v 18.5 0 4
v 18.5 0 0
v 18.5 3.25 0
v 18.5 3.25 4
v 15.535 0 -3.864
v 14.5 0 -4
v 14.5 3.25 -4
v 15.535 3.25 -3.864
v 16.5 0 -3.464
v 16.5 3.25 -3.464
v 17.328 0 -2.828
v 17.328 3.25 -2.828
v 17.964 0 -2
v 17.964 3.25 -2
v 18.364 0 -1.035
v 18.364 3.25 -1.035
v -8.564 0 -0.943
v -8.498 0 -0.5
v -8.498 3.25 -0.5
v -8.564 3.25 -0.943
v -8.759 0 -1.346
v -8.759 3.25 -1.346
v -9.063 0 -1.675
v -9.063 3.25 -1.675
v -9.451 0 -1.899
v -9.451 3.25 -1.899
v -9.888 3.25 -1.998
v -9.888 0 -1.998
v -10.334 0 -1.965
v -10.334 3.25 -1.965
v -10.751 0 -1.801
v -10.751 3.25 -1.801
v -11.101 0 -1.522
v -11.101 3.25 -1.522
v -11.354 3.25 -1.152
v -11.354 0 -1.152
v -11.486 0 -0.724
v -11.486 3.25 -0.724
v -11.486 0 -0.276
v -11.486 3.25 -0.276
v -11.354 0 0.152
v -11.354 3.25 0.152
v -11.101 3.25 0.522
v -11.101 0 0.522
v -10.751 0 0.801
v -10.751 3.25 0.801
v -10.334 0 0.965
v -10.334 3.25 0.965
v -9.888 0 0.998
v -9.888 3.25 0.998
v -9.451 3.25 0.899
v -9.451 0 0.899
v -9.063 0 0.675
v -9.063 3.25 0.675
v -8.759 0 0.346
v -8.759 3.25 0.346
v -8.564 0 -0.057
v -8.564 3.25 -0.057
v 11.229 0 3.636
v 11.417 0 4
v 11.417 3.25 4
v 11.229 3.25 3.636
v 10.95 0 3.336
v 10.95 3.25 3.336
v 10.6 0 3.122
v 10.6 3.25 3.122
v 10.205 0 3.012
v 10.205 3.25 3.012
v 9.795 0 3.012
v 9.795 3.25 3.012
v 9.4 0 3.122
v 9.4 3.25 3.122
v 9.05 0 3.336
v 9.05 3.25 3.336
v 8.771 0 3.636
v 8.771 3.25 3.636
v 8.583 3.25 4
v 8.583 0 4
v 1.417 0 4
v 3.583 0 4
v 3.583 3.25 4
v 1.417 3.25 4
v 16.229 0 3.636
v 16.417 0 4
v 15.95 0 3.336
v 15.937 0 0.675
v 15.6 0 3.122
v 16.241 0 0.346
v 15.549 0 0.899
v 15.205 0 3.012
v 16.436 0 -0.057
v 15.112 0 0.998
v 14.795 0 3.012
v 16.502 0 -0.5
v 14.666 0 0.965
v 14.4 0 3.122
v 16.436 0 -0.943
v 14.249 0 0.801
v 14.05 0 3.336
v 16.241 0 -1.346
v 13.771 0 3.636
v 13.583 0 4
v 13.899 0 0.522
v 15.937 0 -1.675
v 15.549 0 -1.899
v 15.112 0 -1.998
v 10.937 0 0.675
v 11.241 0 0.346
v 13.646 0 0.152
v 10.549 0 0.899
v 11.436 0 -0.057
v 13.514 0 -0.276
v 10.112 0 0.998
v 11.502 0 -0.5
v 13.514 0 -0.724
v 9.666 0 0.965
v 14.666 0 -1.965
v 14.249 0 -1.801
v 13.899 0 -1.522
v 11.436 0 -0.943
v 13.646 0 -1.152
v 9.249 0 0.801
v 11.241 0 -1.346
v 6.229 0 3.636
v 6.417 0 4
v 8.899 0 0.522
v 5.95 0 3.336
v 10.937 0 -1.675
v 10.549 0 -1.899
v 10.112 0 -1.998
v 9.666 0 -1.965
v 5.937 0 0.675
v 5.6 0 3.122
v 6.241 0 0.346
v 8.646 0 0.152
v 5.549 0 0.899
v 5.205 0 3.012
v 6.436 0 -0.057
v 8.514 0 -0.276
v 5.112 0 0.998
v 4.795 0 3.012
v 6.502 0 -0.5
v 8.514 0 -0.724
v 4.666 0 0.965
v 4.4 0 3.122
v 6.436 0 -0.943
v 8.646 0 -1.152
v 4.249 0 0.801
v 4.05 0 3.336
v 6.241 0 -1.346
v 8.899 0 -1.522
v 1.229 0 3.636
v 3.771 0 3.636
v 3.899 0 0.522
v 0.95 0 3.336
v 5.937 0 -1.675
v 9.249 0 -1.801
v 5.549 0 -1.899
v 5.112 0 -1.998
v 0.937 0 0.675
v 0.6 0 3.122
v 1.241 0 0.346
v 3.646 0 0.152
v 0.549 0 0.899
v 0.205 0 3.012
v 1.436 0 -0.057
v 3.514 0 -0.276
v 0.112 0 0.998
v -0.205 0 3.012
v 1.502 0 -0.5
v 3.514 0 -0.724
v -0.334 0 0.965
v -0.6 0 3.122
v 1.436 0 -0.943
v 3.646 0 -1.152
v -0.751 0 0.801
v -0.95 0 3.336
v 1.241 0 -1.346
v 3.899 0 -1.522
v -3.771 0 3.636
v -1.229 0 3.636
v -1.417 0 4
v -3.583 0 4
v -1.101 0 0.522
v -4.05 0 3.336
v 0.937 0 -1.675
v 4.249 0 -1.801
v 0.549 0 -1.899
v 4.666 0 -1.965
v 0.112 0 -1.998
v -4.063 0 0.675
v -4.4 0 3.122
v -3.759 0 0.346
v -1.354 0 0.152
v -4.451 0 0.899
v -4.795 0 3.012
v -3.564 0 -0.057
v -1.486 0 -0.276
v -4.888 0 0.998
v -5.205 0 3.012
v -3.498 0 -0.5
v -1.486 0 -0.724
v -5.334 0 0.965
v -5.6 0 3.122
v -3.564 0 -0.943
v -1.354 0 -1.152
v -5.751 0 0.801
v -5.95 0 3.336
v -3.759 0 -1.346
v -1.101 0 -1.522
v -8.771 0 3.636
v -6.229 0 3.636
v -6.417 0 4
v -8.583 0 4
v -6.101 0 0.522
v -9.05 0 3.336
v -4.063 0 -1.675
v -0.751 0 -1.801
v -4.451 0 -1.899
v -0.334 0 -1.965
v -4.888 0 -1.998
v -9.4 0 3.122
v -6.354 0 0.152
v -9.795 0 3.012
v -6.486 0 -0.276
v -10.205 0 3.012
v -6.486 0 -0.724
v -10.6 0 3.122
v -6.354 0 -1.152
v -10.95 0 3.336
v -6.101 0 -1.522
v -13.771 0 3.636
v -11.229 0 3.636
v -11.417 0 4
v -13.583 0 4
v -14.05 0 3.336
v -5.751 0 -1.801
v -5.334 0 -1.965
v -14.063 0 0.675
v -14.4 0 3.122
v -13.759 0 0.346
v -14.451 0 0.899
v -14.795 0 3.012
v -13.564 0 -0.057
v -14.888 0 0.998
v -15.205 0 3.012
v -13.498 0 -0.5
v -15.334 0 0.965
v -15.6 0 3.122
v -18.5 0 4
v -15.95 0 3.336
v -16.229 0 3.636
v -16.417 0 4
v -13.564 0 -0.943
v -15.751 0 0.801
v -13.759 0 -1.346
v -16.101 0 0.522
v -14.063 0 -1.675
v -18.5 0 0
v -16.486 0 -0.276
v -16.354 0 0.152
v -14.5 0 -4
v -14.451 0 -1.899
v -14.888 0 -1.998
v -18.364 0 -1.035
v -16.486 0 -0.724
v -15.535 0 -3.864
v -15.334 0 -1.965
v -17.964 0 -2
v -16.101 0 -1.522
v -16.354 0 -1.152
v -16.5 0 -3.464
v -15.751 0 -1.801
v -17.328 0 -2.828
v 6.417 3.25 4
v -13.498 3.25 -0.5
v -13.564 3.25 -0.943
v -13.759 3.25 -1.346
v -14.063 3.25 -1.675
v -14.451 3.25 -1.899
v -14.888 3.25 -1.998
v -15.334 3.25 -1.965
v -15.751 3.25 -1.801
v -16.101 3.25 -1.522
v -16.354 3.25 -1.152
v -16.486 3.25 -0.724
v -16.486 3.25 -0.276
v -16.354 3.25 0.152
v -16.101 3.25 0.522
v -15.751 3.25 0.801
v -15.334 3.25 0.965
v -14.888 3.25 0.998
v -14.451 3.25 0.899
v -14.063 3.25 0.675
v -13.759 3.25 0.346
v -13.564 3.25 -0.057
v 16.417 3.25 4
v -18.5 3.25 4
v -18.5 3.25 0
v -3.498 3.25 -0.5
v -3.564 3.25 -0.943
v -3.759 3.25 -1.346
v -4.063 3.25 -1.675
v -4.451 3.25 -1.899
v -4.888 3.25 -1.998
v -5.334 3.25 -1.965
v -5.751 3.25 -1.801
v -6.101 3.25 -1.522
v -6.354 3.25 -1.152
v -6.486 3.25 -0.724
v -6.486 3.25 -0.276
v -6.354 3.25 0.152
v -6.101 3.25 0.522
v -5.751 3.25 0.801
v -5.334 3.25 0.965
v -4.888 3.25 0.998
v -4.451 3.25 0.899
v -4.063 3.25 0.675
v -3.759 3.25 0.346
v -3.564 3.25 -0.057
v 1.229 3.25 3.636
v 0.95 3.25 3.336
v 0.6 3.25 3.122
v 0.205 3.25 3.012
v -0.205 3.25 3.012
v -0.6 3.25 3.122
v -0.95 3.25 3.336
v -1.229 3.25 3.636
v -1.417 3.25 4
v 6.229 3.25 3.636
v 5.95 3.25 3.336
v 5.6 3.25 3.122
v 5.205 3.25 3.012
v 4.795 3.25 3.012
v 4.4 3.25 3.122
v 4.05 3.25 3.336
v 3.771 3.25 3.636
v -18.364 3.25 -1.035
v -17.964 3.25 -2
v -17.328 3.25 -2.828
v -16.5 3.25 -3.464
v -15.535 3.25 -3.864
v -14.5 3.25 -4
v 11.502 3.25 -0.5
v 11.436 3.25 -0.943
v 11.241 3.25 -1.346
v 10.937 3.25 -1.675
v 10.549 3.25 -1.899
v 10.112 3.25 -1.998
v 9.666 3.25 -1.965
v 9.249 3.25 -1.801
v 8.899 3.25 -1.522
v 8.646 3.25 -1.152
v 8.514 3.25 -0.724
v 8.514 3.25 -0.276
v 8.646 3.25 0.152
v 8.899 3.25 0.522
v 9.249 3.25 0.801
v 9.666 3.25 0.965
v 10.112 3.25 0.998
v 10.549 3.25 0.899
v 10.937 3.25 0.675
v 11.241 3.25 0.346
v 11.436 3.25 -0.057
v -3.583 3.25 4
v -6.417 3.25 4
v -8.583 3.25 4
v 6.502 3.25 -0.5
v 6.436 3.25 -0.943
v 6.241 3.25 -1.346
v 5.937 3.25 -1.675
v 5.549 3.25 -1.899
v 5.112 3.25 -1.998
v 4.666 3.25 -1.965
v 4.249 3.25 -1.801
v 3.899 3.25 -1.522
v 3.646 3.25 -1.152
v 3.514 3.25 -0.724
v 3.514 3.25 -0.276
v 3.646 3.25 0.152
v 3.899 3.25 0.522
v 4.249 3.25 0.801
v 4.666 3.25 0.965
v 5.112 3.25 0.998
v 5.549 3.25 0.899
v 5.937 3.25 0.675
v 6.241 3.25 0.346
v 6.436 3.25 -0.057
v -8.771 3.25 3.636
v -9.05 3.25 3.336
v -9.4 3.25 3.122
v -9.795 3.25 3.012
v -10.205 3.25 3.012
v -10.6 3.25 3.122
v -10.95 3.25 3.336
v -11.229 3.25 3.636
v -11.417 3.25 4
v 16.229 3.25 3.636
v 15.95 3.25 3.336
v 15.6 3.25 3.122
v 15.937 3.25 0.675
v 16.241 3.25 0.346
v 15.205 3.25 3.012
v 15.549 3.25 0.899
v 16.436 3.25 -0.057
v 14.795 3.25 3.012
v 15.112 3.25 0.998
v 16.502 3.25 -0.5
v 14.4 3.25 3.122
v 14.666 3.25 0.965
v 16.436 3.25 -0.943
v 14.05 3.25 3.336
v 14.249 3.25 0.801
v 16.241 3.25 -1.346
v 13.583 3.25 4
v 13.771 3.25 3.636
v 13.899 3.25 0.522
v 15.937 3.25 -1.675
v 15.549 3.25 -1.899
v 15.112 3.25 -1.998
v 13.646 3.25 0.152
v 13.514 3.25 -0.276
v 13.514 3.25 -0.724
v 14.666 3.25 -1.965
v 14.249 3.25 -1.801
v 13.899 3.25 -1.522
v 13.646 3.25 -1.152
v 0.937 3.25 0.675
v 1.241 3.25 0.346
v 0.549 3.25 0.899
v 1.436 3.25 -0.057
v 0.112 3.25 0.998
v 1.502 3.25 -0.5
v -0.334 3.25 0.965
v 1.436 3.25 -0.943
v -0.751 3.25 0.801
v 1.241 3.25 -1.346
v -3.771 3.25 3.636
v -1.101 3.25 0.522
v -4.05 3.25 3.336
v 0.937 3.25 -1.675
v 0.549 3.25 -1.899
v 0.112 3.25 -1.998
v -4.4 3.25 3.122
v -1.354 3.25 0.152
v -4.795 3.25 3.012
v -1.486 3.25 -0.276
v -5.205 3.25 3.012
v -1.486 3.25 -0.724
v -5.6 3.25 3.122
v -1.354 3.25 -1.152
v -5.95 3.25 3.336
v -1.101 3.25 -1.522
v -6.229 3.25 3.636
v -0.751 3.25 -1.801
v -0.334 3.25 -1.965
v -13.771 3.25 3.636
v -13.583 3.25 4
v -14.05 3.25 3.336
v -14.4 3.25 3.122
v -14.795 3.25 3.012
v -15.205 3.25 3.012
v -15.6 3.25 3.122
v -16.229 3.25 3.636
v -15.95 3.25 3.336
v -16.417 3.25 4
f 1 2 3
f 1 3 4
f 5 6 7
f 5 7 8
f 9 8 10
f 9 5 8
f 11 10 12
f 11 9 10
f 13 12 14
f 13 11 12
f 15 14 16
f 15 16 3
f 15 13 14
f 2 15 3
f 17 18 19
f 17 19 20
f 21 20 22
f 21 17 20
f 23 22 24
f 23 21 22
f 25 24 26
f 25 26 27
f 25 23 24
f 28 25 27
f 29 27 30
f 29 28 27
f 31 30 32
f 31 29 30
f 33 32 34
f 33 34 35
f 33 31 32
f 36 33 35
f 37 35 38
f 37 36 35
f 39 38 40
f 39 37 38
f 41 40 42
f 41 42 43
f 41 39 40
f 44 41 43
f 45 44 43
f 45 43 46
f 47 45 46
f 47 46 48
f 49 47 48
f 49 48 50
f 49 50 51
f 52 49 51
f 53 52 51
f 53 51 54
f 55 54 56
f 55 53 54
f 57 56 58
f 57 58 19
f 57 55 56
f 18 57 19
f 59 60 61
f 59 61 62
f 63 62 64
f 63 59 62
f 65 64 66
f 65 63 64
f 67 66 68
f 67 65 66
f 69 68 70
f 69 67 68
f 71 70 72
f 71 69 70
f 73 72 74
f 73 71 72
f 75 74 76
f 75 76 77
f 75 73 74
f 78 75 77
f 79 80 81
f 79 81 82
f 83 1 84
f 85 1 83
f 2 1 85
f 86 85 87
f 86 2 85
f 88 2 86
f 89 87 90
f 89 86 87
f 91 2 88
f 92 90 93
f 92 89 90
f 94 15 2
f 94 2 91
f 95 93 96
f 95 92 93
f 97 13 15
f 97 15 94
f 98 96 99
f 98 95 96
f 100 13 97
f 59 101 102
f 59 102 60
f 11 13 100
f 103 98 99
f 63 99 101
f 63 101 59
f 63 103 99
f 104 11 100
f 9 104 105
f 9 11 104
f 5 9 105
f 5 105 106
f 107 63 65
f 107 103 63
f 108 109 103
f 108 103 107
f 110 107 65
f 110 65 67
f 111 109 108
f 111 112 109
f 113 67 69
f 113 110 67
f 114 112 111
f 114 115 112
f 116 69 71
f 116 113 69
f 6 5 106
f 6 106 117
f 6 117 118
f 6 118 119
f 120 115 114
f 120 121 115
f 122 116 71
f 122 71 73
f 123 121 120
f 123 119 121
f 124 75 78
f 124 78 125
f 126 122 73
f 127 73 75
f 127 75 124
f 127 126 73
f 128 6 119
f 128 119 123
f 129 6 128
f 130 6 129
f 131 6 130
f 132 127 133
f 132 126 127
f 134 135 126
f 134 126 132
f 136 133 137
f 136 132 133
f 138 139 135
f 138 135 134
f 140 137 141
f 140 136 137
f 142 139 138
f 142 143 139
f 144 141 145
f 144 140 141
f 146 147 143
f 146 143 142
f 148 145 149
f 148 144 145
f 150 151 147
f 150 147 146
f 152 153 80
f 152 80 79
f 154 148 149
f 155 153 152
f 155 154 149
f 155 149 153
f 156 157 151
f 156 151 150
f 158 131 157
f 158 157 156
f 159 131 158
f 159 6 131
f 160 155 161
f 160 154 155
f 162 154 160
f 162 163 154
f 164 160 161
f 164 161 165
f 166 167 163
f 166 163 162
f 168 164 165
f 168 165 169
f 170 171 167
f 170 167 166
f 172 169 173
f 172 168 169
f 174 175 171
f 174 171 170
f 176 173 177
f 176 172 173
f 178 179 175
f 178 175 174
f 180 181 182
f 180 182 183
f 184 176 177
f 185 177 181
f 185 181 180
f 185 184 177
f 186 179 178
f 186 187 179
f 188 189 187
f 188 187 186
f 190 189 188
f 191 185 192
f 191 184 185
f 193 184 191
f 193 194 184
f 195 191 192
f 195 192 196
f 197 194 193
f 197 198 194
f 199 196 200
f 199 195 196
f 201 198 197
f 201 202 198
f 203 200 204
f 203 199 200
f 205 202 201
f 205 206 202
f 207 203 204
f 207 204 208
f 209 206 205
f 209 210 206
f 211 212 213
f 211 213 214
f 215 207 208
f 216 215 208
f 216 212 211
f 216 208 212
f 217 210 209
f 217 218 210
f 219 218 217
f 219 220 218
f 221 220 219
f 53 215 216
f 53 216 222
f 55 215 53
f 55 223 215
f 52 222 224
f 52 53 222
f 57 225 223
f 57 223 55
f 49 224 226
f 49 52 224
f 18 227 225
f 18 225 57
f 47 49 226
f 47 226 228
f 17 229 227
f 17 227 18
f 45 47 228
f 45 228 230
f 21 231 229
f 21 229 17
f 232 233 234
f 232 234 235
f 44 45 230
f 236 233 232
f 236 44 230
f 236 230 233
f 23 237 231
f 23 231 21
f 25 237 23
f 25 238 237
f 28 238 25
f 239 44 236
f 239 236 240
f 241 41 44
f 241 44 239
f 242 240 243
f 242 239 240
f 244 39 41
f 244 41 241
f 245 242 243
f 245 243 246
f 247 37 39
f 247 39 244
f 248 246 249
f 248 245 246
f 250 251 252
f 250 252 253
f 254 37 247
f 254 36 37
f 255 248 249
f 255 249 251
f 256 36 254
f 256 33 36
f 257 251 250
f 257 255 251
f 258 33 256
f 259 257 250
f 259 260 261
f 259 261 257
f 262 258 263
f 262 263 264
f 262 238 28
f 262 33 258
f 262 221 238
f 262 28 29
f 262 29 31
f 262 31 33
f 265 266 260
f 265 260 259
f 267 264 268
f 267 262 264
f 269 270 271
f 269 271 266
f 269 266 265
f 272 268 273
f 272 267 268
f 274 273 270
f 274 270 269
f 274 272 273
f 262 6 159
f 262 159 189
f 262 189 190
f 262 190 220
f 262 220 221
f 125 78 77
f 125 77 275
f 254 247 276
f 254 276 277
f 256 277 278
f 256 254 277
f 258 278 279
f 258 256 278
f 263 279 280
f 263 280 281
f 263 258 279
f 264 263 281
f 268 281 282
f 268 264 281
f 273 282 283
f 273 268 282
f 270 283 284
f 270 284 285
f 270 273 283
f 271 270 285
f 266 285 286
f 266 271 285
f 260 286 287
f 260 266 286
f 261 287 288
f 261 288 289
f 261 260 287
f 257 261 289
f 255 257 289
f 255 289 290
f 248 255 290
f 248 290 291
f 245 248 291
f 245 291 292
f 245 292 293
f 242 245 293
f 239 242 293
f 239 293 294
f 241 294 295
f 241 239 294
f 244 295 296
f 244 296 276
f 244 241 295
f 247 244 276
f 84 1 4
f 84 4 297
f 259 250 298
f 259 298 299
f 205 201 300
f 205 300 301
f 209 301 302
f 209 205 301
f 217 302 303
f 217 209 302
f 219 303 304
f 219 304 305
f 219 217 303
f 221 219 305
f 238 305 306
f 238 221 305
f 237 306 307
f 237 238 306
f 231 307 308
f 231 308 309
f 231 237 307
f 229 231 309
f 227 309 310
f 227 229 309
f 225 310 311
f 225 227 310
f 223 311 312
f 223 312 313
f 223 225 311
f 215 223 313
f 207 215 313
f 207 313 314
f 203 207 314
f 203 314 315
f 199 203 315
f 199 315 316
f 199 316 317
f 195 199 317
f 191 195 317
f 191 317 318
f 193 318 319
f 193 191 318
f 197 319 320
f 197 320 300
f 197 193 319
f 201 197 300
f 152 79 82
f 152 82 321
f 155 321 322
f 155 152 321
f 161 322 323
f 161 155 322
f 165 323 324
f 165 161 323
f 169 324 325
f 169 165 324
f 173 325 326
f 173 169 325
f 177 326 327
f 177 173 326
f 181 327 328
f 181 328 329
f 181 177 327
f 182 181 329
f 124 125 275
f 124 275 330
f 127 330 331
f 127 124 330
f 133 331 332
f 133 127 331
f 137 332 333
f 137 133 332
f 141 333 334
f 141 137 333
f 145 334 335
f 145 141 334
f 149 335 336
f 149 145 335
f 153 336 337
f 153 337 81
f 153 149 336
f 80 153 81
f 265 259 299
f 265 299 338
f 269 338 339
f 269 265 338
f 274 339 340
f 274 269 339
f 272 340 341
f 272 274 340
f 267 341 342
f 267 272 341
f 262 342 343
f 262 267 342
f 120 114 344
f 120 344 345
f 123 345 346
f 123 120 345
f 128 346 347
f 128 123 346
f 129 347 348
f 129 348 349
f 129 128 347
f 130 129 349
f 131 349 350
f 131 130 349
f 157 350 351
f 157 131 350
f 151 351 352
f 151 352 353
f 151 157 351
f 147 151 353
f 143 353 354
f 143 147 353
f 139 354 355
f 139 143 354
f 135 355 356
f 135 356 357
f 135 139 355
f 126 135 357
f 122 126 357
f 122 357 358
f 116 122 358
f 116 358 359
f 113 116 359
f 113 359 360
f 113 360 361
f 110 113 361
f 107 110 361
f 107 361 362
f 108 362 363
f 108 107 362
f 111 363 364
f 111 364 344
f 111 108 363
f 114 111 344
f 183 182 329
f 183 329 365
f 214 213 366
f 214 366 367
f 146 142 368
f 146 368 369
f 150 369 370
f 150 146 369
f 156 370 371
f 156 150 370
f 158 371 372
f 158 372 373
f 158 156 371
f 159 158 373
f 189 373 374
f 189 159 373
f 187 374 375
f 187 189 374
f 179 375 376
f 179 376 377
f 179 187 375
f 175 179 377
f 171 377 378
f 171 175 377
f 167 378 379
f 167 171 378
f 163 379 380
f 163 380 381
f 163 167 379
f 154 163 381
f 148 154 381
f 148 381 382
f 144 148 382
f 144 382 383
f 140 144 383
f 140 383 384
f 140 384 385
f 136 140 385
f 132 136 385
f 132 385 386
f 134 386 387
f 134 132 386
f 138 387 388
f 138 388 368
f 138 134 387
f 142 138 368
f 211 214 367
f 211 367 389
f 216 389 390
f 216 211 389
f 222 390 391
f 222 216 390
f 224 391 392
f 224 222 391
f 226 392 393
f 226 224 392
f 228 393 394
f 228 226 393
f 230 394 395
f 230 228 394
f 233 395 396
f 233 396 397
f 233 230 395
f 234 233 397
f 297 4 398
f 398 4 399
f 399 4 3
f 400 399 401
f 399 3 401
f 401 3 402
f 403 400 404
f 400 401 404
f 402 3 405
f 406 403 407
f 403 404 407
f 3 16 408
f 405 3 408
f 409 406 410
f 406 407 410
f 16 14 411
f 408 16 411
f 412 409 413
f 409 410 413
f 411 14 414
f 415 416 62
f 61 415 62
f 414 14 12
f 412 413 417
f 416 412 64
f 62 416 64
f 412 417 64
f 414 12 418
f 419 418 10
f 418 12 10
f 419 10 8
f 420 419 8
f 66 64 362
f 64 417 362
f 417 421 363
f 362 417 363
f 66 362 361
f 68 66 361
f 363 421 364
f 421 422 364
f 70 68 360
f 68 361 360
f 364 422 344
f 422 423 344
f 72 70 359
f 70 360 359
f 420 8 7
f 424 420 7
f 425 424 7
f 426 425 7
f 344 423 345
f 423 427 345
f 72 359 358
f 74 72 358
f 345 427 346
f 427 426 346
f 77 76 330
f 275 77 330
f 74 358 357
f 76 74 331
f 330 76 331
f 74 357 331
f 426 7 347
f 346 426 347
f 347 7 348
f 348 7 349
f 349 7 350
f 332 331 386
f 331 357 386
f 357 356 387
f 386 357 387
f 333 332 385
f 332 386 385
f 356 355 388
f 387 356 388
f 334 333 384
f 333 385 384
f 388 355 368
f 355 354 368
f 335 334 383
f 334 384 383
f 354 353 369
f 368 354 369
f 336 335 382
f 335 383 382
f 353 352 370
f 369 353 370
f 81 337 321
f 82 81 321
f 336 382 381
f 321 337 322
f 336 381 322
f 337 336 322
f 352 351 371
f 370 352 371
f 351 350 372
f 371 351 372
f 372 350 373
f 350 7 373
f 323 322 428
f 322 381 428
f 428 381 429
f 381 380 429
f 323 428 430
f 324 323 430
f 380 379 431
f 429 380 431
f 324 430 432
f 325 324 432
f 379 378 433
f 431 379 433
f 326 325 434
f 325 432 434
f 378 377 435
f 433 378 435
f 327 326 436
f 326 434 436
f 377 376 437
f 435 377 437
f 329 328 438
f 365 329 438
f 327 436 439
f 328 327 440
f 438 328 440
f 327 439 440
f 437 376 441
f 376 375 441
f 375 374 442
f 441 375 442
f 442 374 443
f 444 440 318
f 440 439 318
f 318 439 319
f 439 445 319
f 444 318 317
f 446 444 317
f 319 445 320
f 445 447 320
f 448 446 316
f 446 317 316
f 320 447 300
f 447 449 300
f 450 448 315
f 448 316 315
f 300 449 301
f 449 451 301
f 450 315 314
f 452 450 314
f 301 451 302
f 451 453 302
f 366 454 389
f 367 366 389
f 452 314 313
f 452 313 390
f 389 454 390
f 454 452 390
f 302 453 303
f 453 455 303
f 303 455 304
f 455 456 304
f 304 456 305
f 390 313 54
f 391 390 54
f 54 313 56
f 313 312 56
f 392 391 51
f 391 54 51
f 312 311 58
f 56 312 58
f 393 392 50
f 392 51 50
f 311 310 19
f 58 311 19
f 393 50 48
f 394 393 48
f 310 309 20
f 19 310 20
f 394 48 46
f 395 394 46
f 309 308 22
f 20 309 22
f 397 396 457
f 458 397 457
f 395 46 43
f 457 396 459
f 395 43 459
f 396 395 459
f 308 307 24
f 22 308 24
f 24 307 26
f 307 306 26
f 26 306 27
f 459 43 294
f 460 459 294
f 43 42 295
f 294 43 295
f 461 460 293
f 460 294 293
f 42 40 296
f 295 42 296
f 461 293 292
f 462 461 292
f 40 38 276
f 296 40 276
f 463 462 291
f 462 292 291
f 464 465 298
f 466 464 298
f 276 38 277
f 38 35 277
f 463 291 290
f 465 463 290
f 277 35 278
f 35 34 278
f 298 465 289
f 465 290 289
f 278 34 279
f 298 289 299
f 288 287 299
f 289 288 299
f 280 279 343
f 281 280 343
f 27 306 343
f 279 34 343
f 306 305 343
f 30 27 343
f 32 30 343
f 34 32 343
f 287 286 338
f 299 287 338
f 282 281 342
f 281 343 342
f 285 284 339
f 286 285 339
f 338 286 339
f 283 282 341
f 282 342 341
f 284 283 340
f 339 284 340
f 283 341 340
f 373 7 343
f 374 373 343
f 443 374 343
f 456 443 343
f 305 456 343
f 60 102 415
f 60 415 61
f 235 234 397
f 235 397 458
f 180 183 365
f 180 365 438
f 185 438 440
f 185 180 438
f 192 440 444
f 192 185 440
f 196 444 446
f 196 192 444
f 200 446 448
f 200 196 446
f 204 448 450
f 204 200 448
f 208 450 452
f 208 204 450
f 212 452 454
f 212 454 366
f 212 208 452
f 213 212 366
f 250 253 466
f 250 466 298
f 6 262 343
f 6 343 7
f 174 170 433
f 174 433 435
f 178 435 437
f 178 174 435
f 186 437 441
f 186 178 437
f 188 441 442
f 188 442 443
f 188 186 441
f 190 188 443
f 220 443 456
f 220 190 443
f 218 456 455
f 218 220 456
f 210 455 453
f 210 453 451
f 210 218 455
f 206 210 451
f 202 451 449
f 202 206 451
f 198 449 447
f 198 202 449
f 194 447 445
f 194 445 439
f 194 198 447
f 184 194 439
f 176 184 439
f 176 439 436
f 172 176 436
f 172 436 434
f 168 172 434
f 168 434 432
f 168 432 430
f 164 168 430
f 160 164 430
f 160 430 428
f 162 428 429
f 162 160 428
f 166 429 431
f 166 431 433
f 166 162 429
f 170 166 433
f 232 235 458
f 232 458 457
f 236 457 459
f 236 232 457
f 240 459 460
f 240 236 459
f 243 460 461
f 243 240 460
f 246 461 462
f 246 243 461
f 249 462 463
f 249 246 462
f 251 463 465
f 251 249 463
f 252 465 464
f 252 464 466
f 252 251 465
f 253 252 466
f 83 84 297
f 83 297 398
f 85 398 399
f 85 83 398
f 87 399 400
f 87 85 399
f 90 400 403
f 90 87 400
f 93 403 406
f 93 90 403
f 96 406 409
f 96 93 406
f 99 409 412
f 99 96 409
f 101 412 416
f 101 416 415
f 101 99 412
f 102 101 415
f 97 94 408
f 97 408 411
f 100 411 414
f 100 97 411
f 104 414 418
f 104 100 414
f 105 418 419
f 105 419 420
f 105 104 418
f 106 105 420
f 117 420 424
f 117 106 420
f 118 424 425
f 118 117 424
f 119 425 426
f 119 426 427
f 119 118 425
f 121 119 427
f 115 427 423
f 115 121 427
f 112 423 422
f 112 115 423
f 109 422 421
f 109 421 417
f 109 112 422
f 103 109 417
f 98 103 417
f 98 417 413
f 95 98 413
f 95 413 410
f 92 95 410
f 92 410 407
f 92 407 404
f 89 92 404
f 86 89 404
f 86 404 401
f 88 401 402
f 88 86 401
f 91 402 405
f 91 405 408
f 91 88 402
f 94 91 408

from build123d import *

# Parameters (mm, degrees)
SKETCH1_R           = 1.5025
BOSS_EXTRUDE1_DEPTH = 3.25


with BuildPart() as part:
    # Sketch1 → Boss-Extrude1 (new body)
    with BuildSketch(Plane(origin=(0, 0, 0), x_dir=(1, 0, 0), z_dir=(0, 1, 0))):
        with BuildLine():
            Line((-14.5, 4), (14.5, 4))
            ThreePointArc((14.5, 4), (17.328427125, 2.828427125), (18.5, 0))
            Line((18.5, 0), (18.5, -4))
            Line((18.5, -4), (16.416864937, -4))
            ThreePointArc((16.416864937, -4), (15, -2.9975), (13.583135063, -4))
            Line((13.583135063, -4), (11.416864937, -4))
            ThreePointArc((11.416864937, -4), (10, -2.9975), (8.583135063, -4))
            Line((8.583135063, -4), (6.416864937, -4))
            ThreePointArc((6.416864937, -4), (5, -2.9975), (3.583135063, -4))
            Line((3.583135063, -4), (1.416864937, -4))
            ThreePointArc((1.416864937, -4), (0, -2.9975), (-1.416864937, -4))
            Line((-1.416864937, -4), (-3.583135063, -4))
            ThreePointArc((-3.583135063, -4), (-5, -2.9975), (-6.416864937, -4))
            Line((-6.416864937, -4), (-8.583135063, -4))
            ThreePointArc((-8.583135063, -4), (-10, -2.9975), (-11.416864937, -4))
            Line((-11.416864937, -4), (-13.583135063, -4))
            ThreePointArc((-13.583135063, -4), (-15, -2.9975), (-16.416864937, -4))
            Line((-16.416864937, -4), (-18.5, -4))
            Line((-18.5, -4), (-18.5, 0))
            ThreePointArc((-18.5, 0), (-17.328427125, 2.828427125), (-14.5, 4))
        make_face()
        with Locations((-15, 0.5)):
            Circle(SKETCH1_R, mode=Mode.SUBTRACT)
        with Locations((-10, 0.5)):
            Circle(SKETCH1_R, mode=Mode.SUBTRACT)
        with Locations((-5, 0.5)):
            Circle(SKETCH1_R, mode=Mode.SUBTRACT)
        with Locations((0, 0.5)):
            Circle(SKETCH1_R, mode=Mode.SUBTRACT)
        with Locations((5, 0.5)):
            Circle(SKETCH1_R, mode=Mode.SUBTRACT)
        with Locations((10, 0.5)):
            Circle(SKETCH1_R, mode=Mode.SUBTRACT)
        with Locations((15, 0.5)):
            Circle(SKETCH1_R, mode=Mode.SUBTRACT)
    extrude(amount=BOSS_EXTRUDE1_DEPTH)


solid = part.part
